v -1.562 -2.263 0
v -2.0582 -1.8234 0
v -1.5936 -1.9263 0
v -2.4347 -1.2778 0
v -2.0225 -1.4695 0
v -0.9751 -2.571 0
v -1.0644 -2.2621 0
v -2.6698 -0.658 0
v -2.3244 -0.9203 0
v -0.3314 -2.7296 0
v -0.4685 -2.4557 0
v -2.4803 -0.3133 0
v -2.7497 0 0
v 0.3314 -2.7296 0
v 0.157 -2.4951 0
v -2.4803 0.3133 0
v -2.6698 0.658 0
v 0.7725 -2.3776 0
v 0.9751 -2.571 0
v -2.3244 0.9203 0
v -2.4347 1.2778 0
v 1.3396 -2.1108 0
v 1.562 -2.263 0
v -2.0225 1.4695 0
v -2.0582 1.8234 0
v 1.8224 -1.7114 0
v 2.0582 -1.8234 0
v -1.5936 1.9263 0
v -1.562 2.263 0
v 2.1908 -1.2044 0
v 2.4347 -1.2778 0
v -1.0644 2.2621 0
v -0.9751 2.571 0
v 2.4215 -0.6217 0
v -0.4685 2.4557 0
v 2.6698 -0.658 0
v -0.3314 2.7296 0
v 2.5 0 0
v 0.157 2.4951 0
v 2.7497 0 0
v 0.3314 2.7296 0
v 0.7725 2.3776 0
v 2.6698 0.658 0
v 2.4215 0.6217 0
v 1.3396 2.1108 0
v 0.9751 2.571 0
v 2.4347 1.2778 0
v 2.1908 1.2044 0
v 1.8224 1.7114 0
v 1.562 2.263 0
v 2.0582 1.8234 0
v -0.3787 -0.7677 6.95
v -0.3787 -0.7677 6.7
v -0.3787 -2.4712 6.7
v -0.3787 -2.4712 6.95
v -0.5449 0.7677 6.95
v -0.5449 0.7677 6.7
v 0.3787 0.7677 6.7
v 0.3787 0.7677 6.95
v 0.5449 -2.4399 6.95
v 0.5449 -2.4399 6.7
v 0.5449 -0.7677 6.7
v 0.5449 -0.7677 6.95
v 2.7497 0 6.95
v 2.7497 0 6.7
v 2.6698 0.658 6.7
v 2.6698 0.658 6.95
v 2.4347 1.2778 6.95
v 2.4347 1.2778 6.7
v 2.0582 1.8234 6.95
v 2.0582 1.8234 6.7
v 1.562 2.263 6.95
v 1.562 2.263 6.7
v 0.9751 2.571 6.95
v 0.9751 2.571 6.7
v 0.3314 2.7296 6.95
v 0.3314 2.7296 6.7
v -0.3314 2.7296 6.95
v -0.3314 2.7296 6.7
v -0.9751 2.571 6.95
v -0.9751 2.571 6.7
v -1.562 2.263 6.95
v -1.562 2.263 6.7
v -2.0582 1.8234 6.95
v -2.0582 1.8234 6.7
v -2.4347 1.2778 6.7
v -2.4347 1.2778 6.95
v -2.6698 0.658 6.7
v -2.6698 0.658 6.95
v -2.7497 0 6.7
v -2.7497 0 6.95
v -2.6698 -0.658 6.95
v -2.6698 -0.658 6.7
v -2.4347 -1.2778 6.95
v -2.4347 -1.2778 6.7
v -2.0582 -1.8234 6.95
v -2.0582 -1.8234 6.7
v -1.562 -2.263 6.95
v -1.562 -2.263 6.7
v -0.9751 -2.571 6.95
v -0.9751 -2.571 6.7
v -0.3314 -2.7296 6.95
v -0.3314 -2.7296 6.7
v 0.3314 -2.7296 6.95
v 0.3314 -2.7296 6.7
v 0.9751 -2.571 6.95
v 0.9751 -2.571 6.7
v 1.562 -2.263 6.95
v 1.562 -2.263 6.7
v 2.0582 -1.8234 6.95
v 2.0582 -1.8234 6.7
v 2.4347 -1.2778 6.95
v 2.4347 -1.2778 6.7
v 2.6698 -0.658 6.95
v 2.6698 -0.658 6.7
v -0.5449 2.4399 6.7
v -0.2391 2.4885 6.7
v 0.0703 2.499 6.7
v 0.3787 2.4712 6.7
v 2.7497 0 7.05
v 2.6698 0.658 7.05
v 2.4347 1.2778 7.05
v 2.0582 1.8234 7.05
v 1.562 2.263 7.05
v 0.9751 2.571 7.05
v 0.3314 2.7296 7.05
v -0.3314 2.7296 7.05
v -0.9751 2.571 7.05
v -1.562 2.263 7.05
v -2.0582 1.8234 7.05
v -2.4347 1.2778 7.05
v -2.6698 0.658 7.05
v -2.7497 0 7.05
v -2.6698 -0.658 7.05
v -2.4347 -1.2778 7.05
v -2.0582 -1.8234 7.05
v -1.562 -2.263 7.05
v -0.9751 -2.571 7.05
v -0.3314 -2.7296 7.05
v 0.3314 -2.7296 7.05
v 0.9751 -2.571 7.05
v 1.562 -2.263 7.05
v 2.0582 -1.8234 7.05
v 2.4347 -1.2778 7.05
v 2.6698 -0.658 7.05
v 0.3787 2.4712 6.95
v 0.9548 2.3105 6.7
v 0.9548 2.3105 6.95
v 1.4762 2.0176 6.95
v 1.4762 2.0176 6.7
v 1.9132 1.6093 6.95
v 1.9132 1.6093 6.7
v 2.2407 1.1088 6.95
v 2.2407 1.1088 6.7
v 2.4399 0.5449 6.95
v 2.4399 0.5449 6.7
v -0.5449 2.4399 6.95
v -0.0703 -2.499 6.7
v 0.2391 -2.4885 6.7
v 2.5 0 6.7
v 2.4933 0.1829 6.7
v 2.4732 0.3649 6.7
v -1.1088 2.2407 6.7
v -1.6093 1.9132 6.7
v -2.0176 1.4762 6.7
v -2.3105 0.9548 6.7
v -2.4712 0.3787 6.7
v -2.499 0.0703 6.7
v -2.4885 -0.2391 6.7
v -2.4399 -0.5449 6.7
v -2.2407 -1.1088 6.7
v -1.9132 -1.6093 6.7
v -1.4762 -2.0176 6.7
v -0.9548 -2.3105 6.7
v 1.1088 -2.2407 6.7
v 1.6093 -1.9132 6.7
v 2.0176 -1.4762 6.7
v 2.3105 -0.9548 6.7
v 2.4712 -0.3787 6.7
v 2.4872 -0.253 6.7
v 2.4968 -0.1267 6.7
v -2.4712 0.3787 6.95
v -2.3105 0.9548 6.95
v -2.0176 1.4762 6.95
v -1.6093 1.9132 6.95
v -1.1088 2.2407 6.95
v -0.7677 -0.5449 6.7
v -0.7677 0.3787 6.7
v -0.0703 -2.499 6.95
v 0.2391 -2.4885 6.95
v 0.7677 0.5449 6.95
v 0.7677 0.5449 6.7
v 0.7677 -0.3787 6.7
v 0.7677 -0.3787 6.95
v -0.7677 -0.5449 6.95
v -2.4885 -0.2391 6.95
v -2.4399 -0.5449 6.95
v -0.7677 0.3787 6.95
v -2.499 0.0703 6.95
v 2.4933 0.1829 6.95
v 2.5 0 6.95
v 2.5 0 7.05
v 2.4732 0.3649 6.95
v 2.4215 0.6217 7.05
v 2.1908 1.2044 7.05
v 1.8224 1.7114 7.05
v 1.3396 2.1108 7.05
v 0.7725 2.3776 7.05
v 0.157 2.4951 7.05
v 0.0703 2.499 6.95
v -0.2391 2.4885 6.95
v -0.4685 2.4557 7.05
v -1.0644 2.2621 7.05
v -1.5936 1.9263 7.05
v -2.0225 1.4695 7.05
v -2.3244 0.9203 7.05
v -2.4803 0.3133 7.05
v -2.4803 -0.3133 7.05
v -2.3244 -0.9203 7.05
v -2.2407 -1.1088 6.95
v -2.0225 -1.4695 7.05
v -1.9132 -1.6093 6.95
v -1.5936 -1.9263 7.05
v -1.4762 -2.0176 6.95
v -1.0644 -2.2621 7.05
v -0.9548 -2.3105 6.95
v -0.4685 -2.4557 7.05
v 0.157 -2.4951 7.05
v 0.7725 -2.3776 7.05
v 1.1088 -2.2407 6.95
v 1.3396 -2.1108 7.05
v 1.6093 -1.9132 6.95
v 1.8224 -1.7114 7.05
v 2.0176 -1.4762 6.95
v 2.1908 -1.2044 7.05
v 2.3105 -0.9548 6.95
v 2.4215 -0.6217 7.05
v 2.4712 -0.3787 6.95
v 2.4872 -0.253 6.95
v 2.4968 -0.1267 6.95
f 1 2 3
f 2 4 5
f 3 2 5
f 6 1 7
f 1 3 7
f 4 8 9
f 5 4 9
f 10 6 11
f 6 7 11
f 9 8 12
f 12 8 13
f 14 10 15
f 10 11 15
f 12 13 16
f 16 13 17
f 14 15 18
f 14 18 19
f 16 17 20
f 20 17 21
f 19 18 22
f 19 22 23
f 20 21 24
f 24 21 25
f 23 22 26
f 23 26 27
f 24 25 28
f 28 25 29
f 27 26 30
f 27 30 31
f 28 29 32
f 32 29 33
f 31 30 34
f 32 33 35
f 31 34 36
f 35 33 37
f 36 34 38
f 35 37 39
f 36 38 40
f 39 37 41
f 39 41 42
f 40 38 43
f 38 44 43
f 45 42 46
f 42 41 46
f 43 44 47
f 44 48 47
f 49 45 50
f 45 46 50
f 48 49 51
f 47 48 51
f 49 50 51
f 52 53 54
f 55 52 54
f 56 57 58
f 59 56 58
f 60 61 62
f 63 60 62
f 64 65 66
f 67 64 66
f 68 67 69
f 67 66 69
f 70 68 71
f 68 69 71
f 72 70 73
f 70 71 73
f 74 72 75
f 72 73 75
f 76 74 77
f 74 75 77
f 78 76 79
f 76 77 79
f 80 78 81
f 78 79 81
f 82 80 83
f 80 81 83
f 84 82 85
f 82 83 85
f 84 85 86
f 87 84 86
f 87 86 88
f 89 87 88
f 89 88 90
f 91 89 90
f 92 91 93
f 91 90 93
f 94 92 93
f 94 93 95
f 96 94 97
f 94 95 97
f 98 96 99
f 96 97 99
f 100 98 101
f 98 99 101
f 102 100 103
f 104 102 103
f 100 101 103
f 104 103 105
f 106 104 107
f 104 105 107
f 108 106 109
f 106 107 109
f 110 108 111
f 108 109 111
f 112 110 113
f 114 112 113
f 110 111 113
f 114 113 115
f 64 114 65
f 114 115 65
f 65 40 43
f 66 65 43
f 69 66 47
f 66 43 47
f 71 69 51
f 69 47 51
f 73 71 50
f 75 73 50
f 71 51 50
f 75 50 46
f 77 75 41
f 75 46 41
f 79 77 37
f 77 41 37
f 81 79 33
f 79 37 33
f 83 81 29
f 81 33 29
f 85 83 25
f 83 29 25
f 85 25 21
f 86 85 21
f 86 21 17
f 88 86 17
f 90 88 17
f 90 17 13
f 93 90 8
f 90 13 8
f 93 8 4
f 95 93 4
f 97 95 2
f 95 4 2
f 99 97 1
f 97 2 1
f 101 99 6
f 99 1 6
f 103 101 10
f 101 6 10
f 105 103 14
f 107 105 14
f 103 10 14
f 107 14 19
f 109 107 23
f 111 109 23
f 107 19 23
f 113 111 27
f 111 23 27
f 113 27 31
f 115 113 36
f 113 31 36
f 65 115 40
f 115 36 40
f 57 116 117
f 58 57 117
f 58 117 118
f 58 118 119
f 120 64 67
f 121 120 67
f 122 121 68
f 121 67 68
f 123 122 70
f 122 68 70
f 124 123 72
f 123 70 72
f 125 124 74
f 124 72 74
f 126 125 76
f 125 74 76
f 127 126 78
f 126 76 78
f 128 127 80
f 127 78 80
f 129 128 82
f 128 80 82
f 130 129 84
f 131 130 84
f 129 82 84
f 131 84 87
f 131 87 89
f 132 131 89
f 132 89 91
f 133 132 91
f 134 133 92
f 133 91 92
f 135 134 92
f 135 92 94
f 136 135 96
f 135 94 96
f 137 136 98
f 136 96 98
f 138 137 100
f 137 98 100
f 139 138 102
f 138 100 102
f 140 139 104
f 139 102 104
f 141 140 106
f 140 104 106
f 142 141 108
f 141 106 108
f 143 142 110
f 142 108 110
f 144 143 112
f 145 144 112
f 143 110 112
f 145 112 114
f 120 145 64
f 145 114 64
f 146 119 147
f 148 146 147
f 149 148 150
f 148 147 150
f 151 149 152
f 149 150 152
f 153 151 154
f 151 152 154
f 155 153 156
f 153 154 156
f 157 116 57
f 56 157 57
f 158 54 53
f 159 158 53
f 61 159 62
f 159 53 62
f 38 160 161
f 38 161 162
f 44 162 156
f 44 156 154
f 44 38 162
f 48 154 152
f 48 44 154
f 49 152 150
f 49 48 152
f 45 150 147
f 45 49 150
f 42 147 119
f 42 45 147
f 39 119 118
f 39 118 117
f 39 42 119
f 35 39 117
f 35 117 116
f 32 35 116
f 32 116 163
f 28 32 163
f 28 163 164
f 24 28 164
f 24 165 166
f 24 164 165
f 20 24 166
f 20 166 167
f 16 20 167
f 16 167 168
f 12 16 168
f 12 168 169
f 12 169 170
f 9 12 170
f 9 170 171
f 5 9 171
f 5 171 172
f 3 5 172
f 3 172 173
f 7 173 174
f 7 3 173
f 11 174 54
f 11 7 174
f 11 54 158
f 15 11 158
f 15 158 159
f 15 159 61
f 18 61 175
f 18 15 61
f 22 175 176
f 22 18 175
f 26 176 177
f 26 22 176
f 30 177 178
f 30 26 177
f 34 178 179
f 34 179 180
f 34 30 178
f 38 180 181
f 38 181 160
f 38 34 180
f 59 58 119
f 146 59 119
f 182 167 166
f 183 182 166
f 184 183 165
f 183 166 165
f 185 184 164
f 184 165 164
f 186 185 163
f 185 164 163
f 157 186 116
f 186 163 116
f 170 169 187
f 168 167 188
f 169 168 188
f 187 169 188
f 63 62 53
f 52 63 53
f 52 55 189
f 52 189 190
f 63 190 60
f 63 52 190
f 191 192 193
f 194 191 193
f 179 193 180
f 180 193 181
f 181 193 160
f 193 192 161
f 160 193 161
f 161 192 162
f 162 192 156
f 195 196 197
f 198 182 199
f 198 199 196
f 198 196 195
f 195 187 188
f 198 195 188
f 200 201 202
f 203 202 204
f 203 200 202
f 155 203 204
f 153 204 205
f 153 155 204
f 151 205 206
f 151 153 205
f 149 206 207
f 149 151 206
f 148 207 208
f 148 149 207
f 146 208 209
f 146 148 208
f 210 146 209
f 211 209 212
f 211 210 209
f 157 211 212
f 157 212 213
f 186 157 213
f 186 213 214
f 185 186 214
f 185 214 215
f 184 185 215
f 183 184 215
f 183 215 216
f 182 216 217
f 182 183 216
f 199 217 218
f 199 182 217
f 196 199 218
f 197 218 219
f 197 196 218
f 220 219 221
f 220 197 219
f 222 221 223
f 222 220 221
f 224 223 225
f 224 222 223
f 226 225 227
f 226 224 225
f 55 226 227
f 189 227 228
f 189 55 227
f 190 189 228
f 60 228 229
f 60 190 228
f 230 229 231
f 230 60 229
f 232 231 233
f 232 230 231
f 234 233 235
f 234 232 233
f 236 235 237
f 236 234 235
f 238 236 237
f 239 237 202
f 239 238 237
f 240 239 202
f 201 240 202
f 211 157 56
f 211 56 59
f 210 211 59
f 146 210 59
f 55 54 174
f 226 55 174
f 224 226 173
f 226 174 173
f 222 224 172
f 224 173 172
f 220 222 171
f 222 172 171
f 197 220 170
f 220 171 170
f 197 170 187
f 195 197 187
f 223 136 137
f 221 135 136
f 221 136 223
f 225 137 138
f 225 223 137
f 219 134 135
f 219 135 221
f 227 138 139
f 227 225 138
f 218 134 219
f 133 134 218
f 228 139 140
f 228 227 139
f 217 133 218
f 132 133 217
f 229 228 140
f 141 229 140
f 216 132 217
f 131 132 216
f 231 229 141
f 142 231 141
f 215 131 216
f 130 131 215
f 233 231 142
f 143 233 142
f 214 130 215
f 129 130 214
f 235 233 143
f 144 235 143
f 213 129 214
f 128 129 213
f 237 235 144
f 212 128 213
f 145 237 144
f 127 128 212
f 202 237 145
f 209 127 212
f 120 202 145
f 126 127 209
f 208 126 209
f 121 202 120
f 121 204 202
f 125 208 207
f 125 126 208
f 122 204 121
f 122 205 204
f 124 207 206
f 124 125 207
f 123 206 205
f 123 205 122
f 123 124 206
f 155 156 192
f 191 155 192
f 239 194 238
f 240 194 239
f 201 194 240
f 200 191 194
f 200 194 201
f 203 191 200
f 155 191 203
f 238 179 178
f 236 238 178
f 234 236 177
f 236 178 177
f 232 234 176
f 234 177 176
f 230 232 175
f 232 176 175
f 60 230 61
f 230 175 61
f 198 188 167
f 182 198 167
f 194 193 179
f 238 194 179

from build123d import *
from build123d.topology import SkipClean

# Parameters (mm, degrees)
ESQUISSE1_R        = 2.749689511
ESQUISSE1_R_2      = 2.5
BOSS_EXTRU_1_DEPTH = 6.7
ESQUISSE2_R        = 2.749689511
BOSS_EXTRU_2_DEPTH = 0.25
ESQUISSE3_R        = 2.749689511
ESQUISSE3_R_2      = 2.5
BOSS_EXTRU_4_DEPTH = 0.1


with BuildPart() as part:
    # Esquisse1 → Boss.-Extru.1 (new body)
    with BuildSketch(Plane.XY):
        Circle(ESQUISSE1_R)
        Circle(ESQUISSE1_R_2, mode=Mode.SUBTRACT)
    extrude(amount=BOSS_EXTRU_1_DEPTH)

    # Esquisse2 → Boss.-Extru.2 (add)
    with SkipClean():  # the faces are left unmerged after this step: merging them gives an invalid solid
        with BuildSketch(Plane.XY.offset(6.7)):
            Circle(ESQUISSE2_R)
            with BuildLine():
                Line((2.439891921, 0.544910465), (0.767744305, 0.544910465))
                Line((0.767744305, 0.544910465), (0.767744305, -0.378691706))
                Line((0.767744305, -0.378691706), (2.471152078, -0.378691706))
                ThreePointArc((2.471152078, -0.378691706), (1.826552736, -1.70695785), (0.544910465, -2.439891921))
                Line((0.544910465, -2.439891921), (0.544910465, -0.767744305))
                Line((0.544910465, -0.767744305), (-0.378691706, -0.767744305))
                Line((-0.378691706, -0.767744305), (-0.378691706, -2.471152078))
                ThreePointArc((-0.378691706, -2.471152078), (-1.70695785, -1.826552736), (-2.439891921, -0.544910465))
                Line((-2.439891921, -0.544910465), (-0.767744305, -0.544910465))
                Line((-0.767744305, -0.544910465), (-0.767744305, 0.378691706))
                Line((-0.767744305, 0.378691706), (-2.471152078, 0.378691706))
                ThreePointArc((-2.471152078, 0.378691706), (-1.826552736, 1.70695785), (-0.544910465, 2.439891921))
                Line((-0.544910465, 2.439891921), (-0.544910465, 0.767744305))
                Line((-0.544910465, 0.767744305), (0.378691706, 0.767744305))
                Line((0.378691706, 0.767744305), (0.378691706, 2.471152078))
                ThreePointArc((0.378691706, 2.471152078), (1.70695785, 1.826552736), (2.439891921, 0.544910465))
            make_face(mode=Mode.SUBTRACT)
        extrude(amount=BOSS_EXTRU_2_DEPTH)

    # Esquisse3 → Boss.-Extru.4 (add)
    with SkipClean():  # the faces are left unmerged after this step: merging them gives an invalid solid
        with BuildSketch(Plane.XY.offset(6.95)):
            Circle(ESQUISSE3_R)
            Circle(ESQUISSE3_R_2, mode=Mode.SUBTRACT)
        extrude(amount=BOSS_EXTRU_4_DEPTH)


solid = part.part
